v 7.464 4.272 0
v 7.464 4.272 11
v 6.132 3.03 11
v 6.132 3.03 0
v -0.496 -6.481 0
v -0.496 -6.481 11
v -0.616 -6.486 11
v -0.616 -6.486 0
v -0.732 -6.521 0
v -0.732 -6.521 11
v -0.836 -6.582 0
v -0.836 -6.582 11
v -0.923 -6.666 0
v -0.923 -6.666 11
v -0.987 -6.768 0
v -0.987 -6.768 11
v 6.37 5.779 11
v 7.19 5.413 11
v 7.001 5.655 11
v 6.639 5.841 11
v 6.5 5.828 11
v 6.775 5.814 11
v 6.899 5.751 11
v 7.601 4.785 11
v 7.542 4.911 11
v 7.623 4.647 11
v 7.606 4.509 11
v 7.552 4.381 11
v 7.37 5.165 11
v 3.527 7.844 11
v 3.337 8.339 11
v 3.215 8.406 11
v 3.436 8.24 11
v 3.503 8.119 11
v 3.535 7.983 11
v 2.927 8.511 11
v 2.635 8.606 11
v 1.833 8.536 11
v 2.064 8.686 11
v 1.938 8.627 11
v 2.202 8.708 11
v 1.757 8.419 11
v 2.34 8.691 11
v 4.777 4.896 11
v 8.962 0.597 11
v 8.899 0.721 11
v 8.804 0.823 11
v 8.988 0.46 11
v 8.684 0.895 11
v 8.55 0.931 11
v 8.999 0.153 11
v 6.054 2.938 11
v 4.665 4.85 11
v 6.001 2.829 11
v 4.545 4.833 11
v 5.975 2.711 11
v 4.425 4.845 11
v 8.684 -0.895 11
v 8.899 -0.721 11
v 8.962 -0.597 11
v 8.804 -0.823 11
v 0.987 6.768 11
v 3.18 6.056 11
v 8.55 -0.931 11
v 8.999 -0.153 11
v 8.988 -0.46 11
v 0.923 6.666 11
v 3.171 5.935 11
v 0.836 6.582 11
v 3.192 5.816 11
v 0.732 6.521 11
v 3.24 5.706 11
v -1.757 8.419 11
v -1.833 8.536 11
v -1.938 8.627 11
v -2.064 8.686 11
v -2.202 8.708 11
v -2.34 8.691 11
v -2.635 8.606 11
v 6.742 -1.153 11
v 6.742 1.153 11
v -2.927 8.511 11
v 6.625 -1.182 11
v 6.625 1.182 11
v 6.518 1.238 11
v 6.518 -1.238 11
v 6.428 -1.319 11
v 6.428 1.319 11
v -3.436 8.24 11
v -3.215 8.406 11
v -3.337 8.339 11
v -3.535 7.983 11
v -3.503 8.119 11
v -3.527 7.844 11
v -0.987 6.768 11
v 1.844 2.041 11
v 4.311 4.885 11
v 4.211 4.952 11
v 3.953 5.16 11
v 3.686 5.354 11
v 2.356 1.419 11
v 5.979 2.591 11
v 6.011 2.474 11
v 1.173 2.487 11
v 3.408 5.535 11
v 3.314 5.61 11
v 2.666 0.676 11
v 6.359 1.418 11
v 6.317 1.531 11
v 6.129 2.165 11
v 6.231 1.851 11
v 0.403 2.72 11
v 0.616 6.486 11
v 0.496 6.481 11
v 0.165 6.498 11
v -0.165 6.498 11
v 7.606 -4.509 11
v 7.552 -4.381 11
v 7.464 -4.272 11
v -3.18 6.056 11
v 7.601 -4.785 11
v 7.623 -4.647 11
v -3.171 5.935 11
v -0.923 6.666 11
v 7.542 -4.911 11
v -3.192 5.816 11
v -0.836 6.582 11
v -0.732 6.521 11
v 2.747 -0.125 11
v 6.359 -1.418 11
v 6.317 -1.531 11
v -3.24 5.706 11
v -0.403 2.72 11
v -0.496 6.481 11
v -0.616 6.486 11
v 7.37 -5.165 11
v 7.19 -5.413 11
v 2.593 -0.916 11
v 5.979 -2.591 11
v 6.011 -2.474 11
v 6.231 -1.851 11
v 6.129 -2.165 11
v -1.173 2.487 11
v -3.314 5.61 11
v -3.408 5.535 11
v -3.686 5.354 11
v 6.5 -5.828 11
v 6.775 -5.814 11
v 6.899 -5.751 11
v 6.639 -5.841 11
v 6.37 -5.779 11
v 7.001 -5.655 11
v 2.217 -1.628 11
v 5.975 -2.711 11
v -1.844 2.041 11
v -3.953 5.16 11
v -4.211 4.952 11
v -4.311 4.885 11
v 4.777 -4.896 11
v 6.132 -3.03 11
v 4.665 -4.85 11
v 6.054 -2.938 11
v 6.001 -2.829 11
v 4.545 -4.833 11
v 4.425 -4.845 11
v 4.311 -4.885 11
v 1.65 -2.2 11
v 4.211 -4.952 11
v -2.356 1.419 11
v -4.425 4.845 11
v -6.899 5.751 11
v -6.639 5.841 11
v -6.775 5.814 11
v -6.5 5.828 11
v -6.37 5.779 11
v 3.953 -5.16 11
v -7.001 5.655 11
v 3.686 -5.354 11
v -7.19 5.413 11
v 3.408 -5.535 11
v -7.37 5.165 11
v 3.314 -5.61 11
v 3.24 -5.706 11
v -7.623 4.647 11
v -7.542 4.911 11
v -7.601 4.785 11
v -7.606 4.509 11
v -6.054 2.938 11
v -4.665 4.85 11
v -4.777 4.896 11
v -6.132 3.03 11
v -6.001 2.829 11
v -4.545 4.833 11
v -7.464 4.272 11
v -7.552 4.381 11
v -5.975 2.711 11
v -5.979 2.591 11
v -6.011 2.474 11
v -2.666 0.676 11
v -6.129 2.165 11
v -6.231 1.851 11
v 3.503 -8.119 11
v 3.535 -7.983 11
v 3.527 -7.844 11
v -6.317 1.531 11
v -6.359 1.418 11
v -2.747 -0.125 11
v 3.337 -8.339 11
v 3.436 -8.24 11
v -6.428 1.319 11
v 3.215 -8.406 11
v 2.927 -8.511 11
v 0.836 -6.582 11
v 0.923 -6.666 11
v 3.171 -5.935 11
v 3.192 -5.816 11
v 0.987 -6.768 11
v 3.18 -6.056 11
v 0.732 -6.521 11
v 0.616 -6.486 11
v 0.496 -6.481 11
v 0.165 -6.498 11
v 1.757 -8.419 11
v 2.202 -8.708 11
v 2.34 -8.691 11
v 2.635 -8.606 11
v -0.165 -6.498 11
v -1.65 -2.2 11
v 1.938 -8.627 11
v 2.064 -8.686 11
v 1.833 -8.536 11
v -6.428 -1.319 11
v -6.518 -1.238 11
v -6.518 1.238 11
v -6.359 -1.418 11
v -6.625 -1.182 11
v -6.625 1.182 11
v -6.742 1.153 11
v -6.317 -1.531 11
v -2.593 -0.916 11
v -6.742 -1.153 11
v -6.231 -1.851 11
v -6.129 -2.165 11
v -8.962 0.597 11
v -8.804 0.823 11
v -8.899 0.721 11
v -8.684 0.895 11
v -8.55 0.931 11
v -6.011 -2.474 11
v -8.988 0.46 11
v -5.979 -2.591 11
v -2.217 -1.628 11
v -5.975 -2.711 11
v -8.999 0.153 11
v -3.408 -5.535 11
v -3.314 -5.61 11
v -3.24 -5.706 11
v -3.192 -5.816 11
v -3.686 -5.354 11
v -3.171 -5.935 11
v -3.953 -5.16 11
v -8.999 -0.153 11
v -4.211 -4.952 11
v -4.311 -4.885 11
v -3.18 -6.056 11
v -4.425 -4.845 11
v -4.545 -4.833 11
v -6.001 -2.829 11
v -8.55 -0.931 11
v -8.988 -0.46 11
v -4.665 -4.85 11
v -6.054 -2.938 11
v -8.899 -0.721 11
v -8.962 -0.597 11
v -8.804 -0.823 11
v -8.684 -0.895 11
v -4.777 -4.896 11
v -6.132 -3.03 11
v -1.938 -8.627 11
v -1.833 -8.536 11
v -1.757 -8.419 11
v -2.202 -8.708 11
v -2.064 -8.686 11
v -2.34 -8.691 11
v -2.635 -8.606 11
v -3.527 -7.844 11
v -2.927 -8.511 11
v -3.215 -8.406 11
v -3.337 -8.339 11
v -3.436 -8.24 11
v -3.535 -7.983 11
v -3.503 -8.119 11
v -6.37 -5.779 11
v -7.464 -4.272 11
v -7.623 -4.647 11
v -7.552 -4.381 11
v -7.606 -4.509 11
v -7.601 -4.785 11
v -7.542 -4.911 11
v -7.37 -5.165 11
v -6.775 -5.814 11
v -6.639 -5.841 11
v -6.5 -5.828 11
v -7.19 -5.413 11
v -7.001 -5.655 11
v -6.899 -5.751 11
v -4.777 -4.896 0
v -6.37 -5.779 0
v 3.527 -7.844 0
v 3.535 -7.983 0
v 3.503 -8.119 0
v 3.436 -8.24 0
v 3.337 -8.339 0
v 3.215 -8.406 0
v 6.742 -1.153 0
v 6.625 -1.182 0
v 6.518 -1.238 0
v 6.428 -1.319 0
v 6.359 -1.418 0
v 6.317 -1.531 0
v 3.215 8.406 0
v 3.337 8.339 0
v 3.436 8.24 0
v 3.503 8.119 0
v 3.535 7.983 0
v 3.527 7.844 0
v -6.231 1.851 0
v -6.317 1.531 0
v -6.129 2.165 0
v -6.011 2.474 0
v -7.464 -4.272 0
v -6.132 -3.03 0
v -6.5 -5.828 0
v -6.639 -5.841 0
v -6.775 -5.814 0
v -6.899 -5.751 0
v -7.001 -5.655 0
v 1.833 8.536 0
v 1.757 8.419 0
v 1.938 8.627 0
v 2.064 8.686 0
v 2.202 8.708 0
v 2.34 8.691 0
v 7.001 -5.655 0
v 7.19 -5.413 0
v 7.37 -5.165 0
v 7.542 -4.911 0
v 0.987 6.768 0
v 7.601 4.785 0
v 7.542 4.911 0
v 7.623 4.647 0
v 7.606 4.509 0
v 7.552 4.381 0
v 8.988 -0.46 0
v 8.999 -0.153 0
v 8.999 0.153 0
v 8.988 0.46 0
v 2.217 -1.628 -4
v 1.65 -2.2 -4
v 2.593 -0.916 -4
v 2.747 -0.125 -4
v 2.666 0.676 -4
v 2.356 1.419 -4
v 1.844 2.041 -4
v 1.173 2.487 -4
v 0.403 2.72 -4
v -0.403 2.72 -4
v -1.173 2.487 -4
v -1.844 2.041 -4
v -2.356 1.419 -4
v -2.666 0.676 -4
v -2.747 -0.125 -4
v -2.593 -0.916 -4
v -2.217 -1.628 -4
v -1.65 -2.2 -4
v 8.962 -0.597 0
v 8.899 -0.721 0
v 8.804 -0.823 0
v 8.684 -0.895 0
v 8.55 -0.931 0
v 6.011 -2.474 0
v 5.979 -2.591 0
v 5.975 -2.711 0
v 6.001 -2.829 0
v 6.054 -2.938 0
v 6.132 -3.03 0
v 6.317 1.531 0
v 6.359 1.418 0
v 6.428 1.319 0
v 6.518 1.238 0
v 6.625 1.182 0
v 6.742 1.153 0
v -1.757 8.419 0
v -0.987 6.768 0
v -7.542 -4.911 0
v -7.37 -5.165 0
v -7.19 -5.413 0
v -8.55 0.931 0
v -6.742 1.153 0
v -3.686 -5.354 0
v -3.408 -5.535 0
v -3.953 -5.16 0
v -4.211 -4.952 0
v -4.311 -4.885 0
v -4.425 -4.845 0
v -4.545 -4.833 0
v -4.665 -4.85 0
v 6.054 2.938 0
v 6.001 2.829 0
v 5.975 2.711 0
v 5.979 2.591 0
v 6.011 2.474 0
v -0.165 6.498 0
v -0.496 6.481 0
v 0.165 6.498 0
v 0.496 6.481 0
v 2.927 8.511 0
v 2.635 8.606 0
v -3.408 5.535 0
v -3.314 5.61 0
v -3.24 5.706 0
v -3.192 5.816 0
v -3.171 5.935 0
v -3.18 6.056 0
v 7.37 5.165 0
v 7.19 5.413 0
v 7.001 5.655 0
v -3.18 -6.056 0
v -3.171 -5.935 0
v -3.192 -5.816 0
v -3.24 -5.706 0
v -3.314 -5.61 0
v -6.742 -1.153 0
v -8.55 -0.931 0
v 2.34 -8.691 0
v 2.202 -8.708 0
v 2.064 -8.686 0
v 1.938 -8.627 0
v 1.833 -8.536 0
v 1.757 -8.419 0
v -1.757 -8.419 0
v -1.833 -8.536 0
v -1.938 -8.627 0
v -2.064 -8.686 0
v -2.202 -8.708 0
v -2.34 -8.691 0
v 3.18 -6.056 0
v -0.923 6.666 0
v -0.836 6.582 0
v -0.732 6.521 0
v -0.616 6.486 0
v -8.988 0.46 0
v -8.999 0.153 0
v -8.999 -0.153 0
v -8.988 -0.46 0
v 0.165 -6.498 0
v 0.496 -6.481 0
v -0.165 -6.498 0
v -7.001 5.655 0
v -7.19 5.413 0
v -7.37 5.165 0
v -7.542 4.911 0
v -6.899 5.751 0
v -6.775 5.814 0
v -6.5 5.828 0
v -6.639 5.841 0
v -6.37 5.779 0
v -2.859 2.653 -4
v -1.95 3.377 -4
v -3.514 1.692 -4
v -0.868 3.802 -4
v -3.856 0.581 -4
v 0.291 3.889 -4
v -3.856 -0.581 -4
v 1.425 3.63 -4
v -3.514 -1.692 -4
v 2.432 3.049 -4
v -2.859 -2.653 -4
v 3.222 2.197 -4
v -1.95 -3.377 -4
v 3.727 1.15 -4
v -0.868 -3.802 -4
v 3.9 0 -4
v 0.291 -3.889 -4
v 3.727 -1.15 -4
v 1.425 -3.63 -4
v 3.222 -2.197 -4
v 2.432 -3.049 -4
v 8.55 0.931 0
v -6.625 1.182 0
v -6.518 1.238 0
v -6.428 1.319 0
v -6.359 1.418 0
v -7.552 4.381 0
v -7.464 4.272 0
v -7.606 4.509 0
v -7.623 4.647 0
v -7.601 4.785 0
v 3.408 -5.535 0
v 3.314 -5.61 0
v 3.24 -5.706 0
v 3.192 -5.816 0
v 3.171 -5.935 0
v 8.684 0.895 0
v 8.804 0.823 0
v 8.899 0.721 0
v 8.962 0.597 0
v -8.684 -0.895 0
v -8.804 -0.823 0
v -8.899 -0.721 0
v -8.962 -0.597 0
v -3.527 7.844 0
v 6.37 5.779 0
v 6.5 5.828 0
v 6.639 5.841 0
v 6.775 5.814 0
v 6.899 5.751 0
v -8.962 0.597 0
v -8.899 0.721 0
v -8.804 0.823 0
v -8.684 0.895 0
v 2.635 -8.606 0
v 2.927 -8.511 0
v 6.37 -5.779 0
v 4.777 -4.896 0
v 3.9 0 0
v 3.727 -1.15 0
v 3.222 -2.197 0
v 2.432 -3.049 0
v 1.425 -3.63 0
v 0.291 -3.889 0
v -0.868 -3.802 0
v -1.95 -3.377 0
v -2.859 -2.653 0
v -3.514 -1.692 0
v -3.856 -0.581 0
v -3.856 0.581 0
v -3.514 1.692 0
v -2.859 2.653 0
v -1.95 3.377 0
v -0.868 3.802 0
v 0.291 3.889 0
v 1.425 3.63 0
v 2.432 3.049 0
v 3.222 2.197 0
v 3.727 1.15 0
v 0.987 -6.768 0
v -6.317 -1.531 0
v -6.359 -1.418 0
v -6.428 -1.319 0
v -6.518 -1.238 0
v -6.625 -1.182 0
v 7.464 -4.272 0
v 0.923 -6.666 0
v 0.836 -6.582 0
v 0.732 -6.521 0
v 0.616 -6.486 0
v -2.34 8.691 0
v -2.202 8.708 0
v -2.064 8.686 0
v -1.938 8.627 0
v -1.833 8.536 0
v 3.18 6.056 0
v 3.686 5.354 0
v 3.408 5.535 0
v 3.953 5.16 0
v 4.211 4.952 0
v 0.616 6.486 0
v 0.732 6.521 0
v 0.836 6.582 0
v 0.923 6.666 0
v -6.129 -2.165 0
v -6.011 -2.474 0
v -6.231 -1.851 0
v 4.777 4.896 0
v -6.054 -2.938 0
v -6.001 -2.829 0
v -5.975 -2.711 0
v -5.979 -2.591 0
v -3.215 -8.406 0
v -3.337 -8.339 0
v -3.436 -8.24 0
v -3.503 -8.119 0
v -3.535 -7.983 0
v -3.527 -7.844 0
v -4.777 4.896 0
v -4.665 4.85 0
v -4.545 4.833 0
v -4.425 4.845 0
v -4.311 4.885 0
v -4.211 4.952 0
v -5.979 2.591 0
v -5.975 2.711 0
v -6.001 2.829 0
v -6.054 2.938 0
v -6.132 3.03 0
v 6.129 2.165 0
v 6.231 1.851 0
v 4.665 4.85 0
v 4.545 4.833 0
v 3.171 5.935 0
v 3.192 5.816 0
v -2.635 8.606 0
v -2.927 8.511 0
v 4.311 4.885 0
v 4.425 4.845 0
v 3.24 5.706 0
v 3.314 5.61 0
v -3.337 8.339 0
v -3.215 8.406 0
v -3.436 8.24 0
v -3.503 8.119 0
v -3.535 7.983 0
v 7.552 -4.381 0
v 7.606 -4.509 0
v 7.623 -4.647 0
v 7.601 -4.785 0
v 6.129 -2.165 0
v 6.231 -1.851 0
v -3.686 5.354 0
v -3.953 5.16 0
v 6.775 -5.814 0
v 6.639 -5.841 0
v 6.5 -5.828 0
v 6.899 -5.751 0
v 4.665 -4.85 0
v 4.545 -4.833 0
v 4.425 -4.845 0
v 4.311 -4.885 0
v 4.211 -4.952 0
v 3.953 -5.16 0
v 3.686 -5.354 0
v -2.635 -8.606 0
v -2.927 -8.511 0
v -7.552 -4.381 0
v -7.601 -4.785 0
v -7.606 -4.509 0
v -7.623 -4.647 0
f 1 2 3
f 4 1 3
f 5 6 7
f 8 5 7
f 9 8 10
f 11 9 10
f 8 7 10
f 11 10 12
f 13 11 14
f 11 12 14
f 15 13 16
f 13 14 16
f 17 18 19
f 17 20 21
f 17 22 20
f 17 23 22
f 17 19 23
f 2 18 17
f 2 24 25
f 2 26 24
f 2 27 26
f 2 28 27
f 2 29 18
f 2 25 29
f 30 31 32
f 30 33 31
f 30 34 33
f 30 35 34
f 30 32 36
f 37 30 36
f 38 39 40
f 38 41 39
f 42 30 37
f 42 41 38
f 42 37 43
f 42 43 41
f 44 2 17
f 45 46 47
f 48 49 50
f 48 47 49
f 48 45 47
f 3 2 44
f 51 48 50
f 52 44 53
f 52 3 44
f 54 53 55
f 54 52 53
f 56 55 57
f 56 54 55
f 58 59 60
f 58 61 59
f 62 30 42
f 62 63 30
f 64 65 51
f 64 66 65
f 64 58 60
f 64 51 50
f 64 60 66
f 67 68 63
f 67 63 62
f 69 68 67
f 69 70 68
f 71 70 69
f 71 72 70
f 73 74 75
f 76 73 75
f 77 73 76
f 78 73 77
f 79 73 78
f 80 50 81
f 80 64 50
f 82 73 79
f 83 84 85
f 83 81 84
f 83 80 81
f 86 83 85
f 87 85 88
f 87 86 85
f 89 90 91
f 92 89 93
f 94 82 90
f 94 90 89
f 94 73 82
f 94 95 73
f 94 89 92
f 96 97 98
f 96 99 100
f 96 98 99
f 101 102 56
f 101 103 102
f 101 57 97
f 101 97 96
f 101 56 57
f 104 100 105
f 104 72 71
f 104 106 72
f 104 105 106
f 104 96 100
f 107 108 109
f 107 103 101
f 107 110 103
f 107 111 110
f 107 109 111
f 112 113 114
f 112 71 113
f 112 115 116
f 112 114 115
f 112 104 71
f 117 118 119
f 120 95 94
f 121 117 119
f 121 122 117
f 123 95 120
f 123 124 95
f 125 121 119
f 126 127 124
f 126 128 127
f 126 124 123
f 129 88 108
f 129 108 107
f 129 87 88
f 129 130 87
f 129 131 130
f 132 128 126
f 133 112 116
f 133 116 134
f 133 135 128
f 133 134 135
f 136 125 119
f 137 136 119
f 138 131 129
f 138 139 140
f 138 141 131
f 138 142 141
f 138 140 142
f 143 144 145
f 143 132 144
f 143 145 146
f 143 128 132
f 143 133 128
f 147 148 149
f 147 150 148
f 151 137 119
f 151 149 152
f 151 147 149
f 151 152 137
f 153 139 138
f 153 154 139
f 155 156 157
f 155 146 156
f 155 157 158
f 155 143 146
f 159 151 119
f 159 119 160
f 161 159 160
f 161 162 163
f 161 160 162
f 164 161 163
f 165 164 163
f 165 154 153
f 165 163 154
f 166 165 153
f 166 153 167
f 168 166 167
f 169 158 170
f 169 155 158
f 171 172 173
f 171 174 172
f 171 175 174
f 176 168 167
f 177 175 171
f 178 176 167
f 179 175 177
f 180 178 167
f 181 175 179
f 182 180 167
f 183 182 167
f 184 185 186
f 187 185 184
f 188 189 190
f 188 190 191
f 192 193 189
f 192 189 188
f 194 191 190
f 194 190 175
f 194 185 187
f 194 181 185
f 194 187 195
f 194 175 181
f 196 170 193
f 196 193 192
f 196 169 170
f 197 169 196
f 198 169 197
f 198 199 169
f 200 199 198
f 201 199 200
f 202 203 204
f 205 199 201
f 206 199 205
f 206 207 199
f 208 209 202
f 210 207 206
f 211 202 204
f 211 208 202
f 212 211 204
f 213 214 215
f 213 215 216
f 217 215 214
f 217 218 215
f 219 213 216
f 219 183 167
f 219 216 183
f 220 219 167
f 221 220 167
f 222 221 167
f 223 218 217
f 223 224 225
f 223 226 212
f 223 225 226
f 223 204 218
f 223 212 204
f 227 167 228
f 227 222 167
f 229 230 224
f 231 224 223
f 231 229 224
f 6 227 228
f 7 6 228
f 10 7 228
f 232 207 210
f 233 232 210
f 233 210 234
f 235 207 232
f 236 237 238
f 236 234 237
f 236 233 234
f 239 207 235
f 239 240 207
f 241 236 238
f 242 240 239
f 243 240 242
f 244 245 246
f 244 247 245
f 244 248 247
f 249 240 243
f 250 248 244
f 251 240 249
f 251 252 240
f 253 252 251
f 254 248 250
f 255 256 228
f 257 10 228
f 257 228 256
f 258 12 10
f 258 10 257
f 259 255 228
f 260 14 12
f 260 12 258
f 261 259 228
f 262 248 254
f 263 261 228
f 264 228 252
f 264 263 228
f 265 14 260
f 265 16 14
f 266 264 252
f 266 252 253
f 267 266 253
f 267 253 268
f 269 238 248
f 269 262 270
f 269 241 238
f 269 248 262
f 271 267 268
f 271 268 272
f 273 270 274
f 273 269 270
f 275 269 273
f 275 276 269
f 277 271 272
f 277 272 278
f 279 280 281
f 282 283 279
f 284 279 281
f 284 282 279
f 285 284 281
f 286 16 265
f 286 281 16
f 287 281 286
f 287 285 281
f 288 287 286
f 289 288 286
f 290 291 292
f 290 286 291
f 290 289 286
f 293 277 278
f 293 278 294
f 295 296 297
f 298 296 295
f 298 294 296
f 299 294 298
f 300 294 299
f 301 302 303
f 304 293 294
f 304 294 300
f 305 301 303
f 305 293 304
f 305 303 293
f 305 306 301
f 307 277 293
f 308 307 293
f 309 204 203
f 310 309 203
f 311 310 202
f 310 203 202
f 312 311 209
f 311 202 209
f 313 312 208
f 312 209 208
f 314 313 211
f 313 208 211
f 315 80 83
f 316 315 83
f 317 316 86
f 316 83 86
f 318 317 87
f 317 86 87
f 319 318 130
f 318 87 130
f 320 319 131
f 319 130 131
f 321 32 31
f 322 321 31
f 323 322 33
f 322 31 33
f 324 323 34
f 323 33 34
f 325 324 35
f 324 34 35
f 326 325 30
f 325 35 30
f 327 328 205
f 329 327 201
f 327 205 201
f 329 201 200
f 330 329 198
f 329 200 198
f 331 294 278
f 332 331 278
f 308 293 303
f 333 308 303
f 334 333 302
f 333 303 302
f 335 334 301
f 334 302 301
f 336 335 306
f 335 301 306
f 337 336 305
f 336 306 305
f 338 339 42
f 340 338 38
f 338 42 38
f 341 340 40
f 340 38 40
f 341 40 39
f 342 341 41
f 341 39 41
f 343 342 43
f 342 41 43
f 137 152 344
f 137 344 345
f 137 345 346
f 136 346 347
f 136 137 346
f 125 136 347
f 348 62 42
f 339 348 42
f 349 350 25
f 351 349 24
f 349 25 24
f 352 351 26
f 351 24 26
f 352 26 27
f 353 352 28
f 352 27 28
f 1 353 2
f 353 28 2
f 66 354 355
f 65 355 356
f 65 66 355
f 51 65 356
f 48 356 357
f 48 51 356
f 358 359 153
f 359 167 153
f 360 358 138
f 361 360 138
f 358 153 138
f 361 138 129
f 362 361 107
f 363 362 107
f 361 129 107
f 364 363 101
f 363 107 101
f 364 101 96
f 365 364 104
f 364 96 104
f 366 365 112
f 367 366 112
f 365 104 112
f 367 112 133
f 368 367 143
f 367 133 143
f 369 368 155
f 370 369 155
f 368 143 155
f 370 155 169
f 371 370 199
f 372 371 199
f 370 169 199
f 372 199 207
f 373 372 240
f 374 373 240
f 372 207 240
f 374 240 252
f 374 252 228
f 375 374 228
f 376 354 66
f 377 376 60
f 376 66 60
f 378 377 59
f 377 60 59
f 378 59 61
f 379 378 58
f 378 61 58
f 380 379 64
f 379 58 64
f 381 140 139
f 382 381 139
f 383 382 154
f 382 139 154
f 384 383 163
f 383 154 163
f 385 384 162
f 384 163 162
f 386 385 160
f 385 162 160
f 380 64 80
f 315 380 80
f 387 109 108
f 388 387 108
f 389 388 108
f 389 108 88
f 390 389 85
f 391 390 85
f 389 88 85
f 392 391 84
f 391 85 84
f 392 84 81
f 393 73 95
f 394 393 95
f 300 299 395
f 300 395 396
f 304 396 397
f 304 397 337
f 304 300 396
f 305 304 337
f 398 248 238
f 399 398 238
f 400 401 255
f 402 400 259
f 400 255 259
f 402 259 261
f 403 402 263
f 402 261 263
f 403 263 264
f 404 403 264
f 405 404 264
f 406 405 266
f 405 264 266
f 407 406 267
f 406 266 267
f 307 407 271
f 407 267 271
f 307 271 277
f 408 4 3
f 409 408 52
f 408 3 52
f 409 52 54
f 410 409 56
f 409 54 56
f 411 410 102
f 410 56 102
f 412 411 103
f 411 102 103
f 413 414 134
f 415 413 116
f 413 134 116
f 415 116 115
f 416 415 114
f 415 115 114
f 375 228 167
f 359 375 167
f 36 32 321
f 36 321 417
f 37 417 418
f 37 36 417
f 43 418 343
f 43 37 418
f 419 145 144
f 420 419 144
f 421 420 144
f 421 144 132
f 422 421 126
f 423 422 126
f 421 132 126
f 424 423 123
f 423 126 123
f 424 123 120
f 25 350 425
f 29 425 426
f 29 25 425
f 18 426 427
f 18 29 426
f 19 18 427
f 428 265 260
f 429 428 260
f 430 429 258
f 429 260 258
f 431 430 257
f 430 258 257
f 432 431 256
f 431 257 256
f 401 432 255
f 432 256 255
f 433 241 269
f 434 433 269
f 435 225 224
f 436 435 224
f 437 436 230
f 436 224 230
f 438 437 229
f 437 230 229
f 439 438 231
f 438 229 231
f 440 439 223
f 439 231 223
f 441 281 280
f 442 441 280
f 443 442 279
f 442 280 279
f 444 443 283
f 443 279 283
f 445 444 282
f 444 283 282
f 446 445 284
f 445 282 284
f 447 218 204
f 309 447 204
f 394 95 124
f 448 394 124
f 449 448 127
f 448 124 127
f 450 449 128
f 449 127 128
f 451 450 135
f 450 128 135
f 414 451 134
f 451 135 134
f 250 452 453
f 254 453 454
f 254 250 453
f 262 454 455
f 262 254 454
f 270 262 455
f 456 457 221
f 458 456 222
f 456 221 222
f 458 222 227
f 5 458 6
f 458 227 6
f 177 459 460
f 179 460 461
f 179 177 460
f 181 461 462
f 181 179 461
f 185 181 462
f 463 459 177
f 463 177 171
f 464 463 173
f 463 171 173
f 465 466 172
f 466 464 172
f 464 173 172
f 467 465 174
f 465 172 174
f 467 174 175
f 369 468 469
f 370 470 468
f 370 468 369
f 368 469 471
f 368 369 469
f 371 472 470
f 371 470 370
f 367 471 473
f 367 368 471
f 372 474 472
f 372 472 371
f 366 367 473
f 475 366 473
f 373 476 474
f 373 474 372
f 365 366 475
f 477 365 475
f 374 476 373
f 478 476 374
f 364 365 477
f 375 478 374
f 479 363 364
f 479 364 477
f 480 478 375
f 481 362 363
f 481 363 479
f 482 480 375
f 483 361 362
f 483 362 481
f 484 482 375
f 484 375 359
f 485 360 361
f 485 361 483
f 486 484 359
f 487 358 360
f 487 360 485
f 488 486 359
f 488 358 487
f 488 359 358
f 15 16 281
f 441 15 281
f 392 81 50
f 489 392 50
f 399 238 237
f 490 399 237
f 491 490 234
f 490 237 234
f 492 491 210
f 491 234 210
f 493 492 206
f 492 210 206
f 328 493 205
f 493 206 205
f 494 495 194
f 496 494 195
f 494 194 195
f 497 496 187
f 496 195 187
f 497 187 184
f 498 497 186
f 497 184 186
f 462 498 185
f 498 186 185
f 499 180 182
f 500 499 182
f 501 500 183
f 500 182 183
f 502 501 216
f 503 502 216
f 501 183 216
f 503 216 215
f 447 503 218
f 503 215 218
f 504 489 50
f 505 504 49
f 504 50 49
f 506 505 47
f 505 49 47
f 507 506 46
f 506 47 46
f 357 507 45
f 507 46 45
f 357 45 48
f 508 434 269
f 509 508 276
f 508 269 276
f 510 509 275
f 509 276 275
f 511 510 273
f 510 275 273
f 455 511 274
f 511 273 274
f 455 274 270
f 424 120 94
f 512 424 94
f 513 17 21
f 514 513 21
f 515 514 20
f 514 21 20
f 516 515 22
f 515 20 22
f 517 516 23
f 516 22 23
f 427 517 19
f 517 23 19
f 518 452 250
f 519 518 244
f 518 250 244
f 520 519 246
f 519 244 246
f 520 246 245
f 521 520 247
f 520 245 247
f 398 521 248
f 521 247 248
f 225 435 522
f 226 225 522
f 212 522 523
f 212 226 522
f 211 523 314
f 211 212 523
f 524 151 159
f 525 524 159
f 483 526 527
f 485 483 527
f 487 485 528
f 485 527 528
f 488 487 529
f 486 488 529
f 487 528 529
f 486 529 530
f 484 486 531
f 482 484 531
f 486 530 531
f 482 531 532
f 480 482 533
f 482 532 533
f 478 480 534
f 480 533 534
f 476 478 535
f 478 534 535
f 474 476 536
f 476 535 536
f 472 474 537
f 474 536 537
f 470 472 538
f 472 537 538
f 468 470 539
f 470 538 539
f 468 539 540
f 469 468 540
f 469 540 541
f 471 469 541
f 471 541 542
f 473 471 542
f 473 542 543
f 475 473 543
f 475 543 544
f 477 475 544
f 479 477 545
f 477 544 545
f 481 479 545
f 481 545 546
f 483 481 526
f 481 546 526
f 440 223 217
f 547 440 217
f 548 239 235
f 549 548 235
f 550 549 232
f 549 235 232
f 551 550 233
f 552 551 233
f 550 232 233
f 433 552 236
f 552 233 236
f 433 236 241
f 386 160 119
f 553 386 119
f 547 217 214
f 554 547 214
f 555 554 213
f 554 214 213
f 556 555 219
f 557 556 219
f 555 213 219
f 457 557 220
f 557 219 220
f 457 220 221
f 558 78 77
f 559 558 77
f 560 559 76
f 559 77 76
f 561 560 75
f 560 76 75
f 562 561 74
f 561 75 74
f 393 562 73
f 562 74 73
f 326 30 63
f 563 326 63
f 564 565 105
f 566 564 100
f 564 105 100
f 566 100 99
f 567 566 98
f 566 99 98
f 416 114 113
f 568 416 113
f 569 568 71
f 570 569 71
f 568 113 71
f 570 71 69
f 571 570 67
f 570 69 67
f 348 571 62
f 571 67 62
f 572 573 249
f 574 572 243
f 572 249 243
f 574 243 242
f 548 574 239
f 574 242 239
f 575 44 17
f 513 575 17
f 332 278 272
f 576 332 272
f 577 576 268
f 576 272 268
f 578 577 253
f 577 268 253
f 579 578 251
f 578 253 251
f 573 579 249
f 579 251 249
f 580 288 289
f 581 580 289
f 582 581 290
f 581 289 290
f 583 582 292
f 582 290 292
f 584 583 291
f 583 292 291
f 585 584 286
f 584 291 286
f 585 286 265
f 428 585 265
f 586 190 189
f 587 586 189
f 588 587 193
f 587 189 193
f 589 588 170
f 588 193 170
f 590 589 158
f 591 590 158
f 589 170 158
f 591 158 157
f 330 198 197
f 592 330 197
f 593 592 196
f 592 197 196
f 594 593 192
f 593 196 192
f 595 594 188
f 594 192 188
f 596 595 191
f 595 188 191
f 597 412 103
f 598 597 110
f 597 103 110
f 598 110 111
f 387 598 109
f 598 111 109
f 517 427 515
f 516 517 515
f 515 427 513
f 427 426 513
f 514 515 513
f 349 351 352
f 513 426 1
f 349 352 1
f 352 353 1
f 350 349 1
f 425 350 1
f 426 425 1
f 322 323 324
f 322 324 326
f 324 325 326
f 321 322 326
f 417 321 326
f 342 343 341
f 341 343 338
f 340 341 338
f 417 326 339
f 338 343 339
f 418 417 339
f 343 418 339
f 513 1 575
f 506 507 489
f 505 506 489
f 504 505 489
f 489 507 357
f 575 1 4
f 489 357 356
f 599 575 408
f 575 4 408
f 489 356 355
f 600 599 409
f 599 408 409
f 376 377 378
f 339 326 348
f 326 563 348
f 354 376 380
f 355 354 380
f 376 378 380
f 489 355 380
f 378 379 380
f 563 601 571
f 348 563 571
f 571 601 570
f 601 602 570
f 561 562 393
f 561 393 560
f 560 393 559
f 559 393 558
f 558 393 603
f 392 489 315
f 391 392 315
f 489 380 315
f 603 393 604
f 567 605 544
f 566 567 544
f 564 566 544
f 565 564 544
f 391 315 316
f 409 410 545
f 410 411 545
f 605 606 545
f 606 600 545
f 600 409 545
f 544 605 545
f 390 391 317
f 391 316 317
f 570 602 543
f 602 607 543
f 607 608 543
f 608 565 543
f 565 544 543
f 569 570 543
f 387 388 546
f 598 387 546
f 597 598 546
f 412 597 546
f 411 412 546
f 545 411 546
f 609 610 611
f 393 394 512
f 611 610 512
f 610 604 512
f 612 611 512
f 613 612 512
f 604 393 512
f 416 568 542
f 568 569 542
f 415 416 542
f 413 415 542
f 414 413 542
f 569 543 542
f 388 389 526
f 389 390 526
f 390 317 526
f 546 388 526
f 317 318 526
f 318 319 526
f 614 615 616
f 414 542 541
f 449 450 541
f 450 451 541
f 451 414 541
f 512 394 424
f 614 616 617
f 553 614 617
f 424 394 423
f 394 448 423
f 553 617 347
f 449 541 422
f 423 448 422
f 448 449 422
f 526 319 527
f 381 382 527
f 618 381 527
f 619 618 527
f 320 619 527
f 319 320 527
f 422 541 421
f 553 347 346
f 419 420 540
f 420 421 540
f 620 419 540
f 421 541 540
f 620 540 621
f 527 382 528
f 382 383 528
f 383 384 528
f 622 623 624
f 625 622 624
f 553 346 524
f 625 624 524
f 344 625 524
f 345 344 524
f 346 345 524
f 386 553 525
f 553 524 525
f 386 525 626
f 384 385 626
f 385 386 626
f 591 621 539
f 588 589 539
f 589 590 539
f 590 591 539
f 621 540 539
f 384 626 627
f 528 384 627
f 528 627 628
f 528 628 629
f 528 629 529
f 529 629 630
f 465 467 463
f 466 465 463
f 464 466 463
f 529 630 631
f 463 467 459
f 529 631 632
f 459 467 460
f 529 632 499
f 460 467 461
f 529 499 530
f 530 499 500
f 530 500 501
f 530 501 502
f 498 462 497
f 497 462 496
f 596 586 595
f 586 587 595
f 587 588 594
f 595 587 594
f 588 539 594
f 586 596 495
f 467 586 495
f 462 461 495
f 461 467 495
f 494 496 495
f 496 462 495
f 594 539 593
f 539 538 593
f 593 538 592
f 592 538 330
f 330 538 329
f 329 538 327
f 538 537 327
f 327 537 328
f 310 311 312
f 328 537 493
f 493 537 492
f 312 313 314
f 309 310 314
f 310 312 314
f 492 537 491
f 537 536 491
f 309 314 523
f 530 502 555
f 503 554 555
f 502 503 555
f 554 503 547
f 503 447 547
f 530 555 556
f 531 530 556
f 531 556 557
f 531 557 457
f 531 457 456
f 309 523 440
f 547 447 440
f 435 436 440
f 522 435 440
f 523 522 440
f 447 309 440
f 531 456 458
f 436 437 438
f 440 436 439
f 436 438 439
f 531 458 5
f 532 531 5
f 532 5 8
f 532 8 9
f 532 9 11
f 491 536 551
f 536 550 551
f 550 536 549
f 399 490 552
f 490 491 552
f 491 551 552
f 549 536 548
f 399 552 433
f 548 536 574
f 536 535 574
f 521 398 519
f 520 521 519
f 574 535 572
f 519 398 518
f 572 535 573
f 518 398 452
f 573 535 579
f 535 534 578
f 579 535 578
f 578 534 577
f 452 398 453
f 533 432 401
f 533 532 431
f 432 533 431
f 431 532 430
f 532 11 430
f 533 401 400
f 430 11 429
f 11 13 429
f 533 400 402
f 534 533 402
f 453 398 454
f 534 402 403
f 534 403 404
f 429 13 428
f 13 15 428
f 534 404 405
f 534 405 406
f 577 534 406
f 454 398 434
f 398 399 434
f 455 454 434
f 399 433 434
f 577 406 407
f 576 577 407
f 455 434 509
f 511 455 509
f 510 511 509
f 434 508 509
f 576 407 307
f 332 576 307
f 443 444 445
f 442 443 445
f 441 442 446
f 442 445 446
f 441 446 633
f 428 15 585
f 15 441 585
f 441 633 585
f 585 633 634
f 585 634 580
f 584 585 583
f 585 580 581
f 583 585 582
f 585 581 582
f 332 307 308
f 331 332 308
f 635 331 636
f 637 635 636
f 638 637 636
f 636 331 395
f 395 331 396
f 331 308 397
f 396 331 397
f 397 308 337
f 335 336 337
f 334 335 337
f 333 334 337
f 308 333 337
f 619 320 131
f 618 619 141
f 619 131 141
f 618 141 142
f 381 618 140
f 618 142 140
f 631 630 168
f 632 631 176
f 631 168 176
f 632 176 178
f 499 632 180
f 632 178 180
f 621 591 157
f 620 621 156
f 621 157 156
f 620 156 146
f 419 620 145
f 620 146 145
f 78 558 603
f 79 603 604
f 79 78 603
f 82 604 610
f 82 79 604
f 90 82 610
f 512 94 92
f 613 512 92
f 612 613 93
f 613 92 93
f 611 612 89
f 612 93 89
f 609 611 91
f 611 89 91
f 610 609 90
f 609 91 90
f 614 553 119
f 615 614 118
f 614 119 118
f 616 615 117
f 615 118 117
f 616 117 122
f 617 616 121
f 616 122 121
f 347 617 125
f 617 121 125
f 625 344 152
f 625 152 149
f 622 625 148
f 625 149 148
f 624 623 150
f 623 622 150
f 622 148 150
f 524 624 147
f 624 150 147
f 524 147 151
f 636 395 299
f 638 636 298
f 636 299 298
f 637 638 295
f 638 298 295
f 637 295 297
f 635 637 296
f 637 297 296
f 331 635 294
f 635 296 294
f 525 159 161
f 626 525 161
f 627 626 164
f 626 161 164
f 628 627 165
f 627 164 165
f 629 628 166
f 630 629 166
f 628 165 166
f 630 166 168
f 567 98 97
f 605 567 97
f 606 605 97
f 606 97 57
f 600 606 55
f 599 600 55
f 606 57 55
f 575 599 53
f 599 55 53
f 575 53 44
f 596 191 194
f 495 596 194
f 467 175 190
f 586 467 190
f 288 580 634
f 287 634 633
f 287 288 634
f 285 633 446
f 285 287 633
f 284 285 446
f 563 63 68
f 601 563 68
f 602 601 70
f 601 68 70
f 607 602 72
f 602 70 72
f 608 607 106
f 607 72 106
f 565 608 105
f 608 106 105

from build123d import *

# Parameters (mm, degrees)
F0_W            = 9
F0_H            = 11
F3_DEPTH        = 12
F3_COPIES_COUNT = 10
F5_DEPTH        = 25
F6_R            = 3.9
F7_DEPTH        = 4


# Not quite as in the source:
# - a pattern or mirror of a feature is missing from the dataset's text; its kind, count and spacing are read off the source's solid


with BuildPart() as f1:
    # F0 (on Front) → F1 (revolve)
    with BuildSketch(Plane.XZ):
        with Locations((-4.5, 5.5)):
            Rectangle(F0_W, F0_H)
    revolve(axis=Axis((0, 0, 5.5), (0, 0, 1)))

    # F2 (on face) → F3 (cut)
    with BuildSketch(Plane.XY.offset(11)):
        with BuildLine():
            ThreePointArc((-0.495692908, 6.4810715581), (0, 6.5), (0.495692908, 6.4810715581))
            ThreePointArc((0.495692908, 6.4810715581), (0.7861862119, 6.5479757718), (0.9869770252, 6.7683063932))
            Line((0.9869770252, 6.7683063932), (1.7567161864, 8.4190173512))
            ThreePointArc((1.7567161864, 8.4190173512), (1.9988344627, 8.6609895549), (2.3398624375, 8.6905145862))
            ThreePointArc((2.3398624375, 8.6905145862), (0, 9), (-2.3398624375, 8.6905145862))
            ThreePointArc((-2.3398624375, 8.6905145862), (-1.9988344627, 8.6609895549), (-1.7567161864, 8.4190173512))
            Line((-1.7567161864, 8.4190173512), (-0.9869770252, 6.7683063932))
            ThreePointArc((-0.9869770252, 6.7683063932), (-0.7861862119, 6.5479757718), (-0.495692908, 6.4810715581))
        make_face()
    f3 = extrude(amount=-F3_DEPTH, mode=Mode.SUBTRACT)

    # F3_copies: F3 ×10 about axis
    f3_copies_axis = Axis((0, 0, 0), (0, 0, 1))
    for i in range(1, F3_COPIES_COUNT):
        add(f3.rotate(f3_copies_axis, i * 360 / F3_COPIES_COUNT), mode=Mode.SUBTRACT)

    # F4 (on face) → F5 (cut)
    with BuildSketch(Plane.XY.offset(11)):
        with BuildLine():
            Line((-1.65, -2.2), (1.65, -2.2))
            ThreePointArc((1.65, -2.2), (0, 2.75), (-1.65, -2.2))
        make_face()
    extrude(amount=-F5_DEPTH, mode=Mode.SUBTRACT)

    # F6 (on face) → F7 (join)
    with BuildSketch(Plane(origin=(0, 0, 0), x_dir=(1, 0, 0), z_dir=(0, 0, -1))):
        Circle(F6_R)
        with BuildLine():
            ThreePointArc((1.65, 2.2), (0, -2.75), (-1.65, 2.2))
            Line((-1.65, 2.2), (1.65, 2.2))
        make_face(mode=Mode.SUBTRACT)
    extrude(amount=F7_DEPTH)


solid = f1.part
